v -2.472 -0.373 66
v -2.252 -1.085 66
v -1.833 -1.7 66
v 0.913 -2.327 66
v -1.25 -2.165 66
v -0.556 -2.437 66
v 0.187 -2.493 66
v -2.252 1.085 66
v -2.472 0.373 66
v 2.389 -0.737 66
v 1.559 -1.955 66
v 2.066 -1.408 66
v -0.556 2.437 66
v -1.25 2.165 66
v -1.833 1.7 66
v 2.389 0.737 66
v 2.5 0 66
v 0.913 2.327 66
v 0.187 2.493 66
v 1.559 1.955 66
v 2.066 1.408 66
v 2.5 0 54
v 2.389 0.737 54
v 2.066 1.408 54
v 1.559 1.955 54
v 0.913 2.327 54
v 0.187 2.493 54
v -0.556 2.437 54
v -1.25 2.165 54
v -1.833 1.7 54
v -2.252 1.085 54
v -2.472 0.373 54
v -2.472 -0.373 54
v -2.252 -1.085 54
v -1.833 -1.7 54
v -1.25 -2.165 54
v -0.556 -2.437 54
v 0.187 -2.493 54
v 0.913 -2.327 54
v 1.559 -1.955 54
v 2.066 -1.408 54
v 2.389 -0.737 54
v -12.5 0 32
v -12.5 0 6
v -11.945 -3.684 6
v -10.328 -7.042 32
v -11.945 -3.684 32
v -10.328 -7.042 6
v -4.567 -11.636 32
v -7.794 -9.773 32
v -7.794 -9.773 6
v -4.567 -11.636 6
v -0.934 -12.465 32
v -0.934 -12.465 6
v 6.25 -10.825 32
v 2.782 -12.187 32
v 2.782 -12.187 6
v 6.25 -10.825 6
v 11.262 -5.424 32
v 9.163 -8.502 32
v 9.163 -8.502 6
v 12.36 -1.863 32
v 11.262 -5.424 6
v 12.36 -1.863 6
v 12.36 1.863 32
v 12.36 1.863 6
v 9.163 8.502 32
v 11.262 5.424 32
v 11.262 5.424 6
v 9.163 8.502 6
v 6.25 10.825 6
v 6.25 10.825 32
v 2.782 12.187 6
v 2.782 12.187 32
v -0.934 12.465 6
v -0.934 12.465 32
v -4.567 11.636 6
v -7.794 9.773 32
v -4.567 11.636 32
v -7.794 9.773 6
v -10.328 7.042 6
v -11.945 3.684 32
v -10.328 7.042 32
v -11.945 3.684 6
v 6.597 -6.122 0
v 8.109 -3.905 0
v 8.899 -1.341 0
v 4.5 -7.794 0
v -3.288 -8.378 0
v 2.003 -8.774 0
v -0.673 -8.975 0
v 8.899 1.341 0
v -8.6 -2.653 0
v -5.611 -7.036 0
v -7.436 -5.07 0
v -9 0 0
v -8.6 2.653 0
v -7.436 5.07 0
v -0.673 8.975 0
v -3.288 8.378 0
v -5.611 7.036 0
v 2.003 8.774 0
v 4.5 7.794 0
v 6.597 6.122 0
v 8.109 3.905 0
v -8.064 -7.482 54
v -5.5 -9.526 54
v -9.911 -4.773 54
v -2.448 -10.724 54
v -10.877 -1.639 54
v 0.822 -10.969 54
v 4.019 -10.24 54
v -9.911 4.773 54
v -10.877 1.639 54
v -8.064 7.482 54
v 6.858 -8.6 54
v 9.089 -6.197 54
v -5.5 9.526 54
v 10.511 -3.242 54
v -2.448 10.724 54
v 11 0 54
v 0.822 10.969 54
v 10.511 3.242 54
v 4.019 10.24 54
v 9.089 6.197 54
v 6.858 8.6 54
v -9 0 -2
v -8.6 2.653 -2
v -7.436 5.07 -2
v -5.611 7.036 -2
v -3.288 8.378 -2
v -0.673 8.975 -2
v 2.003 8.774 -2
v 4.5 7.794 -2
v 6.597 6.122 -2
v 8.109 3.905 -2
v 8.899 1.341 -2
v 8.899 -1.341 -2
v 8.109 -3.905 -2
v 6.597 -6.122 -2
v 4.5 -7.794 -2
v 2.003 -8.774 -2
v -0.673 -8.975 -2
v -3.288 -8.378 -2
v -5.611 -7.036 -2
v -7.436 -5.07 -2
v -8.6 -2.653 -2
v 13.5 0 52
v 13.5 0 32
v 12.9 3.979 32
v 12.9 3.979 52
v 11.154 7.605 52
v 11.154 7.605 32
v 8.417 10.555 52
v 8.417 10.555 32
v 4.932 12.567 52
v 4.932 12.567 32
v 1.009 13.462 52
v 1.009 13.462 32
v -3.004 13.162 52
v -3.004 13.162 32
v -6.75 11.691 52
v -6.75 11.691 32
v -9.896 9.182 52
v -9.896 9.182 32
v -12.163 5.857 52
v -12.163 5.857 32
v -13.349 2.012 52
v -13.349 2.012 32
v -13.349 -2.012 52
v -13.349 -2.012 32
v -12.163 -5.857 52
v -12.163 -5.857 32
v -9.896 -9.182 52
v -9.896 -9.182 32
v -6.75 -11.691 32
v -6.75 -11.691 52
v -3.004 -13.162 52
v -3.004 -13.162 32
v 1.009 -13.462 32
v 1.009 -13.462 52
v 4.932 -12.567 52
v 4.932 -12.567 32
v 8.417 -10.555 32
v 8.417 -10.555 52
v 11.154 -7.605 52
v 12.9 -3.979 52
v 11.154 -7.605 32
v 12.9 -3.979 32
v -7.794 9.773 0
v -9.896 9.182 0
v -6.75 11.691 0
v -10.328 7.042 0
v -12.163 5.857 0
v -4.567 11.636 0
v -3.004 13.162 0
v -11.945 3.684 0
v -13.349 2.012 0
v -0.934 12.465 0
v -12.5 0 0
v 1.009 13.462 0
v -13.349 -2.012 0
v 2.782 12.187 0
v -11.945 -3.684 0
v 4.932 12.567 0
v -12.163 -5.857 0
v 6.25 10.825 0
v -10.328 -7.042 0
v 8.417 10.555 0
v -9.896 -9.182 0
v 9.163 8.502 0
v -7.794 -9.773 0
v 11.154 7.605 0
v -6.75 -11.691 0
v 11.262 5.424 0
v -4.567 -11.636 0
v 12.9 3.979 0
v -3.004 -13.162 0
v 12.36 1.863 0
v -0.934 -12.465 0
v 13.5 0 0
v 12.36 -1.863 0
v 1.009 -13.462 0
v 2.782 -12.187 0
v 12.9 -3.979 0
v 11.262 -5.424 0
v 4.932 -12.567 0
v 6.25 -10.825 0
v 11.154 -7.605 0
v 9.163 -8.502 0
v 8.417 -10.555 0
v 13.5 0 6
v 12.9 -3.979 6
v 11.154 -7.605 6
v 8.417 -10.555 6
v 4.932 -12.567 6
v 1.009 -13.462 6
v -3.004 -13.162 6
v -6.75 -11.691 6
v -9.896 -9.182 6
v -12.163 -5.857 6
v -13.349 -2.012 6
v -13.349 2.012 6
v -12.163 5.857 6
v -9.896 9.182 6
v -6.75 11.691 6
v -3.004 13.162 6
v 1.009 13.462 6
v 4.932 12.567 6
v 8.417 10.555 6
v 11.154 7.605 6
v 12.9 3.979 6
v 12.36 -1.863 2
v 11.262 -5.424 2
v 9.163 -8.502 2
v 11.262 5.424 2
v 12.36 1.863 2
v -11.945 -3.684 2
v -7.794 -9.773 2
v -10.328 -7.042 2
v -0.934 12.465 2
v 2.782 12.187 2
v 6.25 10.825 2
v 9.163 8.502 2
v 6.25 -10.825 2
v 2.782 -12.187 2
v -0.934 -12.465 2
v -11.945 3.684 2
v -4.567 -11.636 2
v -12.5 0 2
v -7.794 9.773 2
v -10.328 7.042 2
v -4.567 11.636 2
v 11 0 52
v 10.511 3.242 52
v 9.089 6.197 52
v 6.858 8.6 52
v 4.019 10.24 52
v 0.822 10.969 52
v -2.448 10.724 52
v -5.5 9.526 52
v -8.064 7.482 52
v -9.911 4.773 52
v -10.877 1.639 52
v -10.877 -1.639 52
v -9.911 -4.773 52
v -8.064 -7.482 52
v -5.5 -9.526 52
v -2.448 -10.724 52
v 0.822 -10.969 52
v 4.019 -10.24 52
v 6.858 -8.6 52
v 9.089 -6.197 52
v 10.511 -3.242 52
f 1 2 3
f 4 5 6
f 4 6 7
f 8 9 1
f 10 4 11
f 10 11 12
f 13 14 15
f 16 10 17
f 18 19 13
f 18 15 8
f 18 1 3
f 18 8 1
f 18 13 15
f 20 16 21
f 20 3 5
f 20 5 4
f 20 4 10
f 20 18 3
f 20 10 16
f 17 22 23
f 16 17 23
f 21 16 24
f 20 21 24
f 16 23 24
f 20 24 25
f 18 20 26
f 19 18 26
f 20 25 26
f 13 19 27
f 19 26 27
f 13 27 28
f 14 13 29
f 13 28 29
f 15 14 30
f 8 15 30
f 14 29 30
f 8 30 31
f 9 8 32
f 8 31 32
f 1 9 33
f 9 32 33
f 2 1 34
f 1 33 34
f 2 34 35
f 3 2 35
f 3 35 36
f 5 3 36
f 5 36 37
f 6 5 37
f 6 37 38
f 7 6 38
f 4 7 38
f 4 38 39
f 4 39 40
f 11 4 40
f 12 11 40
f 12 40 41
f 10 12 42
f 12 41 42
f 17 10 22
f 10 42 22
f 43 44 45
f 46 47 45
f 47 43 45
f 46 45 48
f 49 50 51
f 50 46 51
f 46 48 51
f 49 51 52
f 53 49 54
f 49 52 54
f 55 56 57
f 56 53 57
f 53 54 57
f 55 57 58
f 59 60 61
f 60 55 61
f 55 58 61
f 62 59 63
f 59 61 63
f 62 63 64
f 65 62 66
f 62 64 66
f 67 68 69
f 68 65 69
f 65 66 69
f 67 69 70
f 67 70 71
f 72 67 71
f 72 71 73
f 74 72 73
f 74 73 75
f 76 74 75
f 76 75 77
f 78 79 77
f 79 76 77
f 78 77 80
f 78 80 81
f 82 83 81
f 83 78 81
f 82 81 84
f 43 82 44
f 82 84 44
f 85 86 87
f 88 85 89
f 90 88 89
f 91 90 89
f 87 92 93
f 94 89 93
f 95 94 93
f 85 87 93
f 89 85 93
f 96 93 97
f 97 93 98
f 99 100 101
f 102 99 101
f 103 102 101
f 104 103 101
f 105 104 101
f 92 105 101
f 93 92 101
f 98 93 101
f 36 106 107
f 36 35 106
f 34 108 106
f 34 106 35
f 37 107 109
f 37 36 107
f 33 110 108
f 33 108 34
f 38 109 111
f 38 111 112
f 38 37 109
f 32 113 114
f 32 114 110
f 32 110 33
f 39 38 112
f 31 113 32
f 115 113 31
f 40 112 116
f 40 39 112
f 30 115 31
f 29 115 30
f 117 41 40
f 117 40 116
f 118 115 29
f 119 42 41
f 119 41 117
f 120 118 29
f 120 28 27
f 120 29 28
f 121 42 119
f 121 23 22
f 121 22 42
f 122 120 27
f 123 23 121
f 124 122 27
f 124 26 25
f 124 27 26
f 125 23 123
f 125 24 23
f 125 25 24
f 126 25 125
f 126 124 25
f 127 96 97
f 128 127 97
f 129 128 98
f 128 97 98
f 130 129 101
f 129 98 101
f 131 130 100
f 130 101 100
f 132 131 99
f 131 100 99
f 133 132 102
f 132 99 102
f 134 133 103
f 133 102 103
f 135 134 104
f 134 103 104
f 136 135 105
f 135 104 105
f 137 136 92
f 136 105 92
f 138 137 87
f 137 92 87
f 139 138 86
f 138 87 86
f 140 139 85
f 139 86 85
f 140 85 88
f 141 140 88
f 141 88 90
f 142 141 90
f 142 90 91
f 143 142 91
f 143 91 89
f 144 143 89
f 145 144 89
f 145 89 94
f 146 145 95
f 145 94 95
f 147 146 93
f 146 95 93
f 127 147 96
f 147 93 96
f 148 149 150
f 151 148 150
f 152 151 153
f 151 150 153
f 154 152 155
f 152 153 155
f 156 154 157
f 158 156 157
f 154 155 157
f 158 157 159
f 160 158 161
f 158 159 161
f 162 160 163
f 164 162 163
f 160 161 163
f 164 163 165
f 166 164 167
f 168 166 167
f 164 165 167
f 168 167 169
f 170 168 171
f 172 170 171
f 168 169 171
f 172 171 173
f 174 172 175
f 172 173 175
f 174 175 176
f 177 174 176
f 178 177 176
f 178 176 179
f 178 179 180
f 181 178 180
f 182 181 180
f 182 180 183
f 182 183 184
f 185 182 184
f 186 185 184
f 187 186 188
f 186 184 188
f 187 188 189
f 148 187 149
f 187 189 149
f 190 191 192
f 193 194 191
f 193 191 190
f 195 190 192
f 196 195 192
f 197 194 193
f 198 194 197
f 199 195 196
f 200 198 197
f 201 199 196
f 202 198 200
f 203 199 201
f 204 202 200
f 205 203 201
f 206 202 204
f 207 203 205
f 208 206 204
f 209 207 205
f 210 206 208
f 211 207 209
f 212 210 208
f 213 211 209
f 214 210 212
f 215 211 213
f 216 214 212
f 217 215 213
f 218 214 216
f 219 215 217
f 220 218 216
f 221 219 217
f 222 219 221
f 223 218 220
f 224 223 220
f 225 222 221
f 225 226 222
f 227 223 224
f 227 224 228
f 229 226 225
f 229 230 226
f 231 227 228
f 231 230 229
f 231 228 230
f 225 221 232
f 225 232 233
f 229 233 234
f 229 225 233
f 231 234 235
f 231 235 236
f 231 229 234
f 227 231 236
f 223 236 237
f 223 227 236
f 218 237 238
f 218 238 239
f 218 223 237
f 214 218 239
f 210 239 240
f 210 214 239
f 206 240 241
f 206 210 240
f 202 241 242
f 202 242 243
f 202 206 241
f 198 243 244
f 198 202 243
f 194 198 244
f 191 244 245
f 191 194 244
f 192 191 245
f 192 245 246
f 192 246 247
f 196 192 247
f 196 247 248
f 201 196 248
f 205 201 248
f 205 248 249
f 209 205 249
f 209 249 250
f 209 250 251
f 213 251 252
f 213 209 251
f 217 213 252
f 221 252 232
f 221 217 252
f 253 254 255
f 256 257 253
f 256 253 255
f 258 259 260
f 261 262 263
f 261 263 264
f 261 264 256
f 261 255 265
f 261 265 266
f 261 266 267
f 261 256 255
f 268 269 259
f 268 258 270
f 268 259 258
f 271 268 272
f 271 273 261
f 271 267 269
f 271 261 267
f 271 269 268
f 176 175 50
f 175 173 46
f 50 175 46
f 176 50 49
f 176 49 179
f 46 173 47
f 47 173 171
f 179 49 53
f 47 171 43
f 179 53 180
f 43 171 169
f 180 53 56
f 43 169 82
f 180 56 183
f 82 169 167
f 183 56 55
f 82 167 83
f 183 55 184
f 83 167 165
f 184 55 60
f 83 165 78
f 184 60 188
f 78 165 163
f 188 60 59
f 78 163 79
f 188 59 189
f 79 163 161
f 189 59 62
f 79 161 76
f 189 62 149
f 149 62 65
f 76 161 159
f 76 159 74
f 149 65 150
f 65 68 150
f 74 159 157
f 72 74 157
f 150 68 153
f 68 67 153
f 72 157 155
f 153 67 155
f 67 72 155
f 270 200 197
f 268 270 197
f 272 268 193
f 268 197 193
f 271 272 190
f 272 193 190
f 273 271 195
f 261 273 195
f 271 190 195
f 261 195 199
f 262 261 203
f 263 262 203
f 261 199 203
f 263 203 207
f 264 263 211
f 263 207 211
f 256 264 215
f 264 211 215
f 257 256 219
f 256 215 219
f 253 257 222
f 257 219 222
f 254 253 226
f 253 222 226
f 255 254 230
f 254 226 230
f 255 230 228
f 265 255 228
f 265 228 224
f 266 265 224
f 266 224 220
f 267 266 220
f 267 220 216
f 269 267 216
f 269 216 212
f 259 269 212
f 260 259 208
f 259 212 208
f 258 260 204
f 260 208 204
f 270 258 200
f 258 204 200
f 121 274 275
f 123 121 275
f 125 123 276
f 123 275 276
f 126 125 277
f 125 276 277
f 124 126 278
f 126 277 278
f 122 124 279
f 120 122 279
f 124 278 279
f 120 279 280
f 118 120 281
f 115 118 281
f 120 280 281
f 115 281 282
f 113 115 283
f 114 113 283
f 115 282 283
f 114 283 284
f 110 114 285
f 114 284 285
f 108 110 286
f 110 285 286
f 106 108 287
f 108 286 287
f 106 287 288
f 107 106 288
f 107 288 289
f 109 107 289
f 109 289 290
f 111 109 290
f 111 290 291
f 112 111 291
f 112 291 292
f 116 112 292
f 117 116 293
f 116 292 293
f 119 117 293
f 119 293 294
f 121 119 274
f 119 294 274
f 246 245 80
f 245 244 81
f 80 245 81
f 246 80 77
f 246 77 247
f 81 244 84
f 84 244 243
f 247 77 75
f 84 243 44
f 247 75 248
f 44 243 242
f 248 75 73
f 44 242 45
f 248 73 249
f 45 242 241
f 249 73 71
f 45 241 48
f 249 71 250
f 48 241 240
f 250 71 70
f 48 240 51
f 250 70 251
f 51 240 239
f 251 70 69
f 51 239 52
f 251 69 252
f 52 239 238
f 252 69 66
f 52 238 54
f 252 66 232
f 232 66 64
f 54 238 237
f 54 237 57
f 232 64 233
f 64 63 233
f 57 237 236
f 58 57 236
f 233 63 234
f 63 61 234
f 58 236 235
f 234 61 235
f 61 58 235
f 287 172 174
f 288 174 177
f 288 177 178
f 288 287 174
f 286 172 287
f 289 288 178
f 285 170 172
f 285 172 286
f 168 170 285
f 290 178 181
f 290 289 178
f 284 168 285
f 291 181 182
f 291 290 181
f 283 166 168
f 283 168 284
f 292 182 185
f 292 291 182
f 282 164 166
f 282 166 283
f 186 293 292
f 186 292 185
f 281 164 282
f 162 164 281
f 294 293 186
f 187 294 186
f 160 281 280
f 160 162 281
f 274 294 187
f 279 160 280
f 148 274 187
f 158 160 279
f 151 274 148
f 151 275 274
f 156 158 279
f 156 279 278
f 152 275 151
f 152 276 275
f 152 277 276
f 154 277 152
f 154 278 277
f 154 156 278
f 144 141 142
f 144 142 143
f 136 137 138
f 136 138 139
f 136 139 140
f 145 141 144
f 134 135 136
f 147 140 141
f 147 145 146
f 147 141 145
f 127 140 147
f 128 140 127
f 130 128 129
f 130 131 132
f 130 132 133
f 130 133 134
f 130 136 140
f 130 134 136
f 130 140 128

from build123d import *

# Parameters (mm, degrees)
SKETCH1_R           = 12.5
BOSS_EXTRUDE1_DEPTH = 52
SKETCH2_R           = 11
BOSS_EXTRUDE3_DEPTH = 2
SKETCH4_R           = 2.5
BOSS_EXTRUDE4_DEPTH = 12
BOSS_EXTRUDE5_START = -20
SKETCH5_R           = 13.5
BOSS_EXTRUDE5_DEPTH = 20
SKETCH6_R           = 13.5
BOSS_EXTRUDE6_DEPTH = 6
SKETCH8_R           = 9
BOSS_EXTRUDE7_DEPTH = 2
SKETCH9_R           = 12.5
CUT_EXTRUDE3_DEPTH  = 2


with BuildPart() as part:
    # Sketch1 → Boss-Extrude1 (new body)
    with BuildSketch(Plane.XY):
        with Locations(Location((0, 0, 0), (0, 0, 180))):
            Circle(SKETCH1_R)
    extrude(amount=BOSS_EXTRUDE1_DEPTH)

    # Sketch2 → Boss-Extrude3 (add)
    with BuildSketch(Plane.XY.offset(52)):
        Circle(SKETCH2_R)
    extrude(amount=BOSS_EXTRUDE3_DEPTH)

    # Sketch4 → Boss-Extrude4 (add)
    with BuildSketch(Plane.XY.offset(54)):
        Circle(SKETCH4_R)
    extrude(amount=BOSS_EXTRUDE4_DEPTH)

    # Sketch5 → Boss-Extrude5 (add)
    with BuildSketch(Plane.XY.offset(52).offset(BOSS_EXTRUDE5_START)):
        Circle(SKETCH5_R)
    extrude(amount=BOSS_EXTRUDE5_DEPTH)

    # Sketch6 → Boss-Extrude6 (add)
    with BuildSketch(Plane(origin=(0, 0, 0), x_dir=(-1, 0, 0), z_dir=(0, 0, -1))):
        with Locations(Location((0, 0, 0), (0, 0, 180))):
            Circle(SKETCH6_R)
    extrude(amount=-BOSS_EXTRUDE6_DEPTH)

    # Sketch8 → Boss-Extrude7 (add)
    with BuildSketch(Plane(origin=(0, 0, 0), x_dir=(-1, 0, 0), z_dir=(0, 0, -1))):
        Circle(SKETCH8_R)
    extrude(amount=BOSS_EXTRUDE7_DEPTH)

    # Sketch9 → Cut-Extrude3 (cut)
    with BuildSketch(Plane(origin=(0, 0, 0), x_dir=(-1, 0, 0), z_dir=(0, 0, -1))):
        Circle(SKETCH9_R)
    extrude(amount=-CUT_EXTRUDE3_DEPTH, mode=Mode.SUBTRACT)


with BuildPart() as cut_extrude3_piece_1:
    # of the separate pieces the step leaves, piece 1, a body of its own (cut_extrude3_pieces)
    add(part.part.solids().sort_by_distance((13.5, 0, 0))[0])


with BuildPart() as cut_extrude3_piece_2:
    # of the separate pieces the step leaves, piece 2, a body of its own (cut_extrude3_pieces)
    add(part.part.solids().sort_by_distance((-9, 0, 0))[0])


solid = Compound([cut_extrude3_piece_1.part, cut_extrude3_piece_2.part])
